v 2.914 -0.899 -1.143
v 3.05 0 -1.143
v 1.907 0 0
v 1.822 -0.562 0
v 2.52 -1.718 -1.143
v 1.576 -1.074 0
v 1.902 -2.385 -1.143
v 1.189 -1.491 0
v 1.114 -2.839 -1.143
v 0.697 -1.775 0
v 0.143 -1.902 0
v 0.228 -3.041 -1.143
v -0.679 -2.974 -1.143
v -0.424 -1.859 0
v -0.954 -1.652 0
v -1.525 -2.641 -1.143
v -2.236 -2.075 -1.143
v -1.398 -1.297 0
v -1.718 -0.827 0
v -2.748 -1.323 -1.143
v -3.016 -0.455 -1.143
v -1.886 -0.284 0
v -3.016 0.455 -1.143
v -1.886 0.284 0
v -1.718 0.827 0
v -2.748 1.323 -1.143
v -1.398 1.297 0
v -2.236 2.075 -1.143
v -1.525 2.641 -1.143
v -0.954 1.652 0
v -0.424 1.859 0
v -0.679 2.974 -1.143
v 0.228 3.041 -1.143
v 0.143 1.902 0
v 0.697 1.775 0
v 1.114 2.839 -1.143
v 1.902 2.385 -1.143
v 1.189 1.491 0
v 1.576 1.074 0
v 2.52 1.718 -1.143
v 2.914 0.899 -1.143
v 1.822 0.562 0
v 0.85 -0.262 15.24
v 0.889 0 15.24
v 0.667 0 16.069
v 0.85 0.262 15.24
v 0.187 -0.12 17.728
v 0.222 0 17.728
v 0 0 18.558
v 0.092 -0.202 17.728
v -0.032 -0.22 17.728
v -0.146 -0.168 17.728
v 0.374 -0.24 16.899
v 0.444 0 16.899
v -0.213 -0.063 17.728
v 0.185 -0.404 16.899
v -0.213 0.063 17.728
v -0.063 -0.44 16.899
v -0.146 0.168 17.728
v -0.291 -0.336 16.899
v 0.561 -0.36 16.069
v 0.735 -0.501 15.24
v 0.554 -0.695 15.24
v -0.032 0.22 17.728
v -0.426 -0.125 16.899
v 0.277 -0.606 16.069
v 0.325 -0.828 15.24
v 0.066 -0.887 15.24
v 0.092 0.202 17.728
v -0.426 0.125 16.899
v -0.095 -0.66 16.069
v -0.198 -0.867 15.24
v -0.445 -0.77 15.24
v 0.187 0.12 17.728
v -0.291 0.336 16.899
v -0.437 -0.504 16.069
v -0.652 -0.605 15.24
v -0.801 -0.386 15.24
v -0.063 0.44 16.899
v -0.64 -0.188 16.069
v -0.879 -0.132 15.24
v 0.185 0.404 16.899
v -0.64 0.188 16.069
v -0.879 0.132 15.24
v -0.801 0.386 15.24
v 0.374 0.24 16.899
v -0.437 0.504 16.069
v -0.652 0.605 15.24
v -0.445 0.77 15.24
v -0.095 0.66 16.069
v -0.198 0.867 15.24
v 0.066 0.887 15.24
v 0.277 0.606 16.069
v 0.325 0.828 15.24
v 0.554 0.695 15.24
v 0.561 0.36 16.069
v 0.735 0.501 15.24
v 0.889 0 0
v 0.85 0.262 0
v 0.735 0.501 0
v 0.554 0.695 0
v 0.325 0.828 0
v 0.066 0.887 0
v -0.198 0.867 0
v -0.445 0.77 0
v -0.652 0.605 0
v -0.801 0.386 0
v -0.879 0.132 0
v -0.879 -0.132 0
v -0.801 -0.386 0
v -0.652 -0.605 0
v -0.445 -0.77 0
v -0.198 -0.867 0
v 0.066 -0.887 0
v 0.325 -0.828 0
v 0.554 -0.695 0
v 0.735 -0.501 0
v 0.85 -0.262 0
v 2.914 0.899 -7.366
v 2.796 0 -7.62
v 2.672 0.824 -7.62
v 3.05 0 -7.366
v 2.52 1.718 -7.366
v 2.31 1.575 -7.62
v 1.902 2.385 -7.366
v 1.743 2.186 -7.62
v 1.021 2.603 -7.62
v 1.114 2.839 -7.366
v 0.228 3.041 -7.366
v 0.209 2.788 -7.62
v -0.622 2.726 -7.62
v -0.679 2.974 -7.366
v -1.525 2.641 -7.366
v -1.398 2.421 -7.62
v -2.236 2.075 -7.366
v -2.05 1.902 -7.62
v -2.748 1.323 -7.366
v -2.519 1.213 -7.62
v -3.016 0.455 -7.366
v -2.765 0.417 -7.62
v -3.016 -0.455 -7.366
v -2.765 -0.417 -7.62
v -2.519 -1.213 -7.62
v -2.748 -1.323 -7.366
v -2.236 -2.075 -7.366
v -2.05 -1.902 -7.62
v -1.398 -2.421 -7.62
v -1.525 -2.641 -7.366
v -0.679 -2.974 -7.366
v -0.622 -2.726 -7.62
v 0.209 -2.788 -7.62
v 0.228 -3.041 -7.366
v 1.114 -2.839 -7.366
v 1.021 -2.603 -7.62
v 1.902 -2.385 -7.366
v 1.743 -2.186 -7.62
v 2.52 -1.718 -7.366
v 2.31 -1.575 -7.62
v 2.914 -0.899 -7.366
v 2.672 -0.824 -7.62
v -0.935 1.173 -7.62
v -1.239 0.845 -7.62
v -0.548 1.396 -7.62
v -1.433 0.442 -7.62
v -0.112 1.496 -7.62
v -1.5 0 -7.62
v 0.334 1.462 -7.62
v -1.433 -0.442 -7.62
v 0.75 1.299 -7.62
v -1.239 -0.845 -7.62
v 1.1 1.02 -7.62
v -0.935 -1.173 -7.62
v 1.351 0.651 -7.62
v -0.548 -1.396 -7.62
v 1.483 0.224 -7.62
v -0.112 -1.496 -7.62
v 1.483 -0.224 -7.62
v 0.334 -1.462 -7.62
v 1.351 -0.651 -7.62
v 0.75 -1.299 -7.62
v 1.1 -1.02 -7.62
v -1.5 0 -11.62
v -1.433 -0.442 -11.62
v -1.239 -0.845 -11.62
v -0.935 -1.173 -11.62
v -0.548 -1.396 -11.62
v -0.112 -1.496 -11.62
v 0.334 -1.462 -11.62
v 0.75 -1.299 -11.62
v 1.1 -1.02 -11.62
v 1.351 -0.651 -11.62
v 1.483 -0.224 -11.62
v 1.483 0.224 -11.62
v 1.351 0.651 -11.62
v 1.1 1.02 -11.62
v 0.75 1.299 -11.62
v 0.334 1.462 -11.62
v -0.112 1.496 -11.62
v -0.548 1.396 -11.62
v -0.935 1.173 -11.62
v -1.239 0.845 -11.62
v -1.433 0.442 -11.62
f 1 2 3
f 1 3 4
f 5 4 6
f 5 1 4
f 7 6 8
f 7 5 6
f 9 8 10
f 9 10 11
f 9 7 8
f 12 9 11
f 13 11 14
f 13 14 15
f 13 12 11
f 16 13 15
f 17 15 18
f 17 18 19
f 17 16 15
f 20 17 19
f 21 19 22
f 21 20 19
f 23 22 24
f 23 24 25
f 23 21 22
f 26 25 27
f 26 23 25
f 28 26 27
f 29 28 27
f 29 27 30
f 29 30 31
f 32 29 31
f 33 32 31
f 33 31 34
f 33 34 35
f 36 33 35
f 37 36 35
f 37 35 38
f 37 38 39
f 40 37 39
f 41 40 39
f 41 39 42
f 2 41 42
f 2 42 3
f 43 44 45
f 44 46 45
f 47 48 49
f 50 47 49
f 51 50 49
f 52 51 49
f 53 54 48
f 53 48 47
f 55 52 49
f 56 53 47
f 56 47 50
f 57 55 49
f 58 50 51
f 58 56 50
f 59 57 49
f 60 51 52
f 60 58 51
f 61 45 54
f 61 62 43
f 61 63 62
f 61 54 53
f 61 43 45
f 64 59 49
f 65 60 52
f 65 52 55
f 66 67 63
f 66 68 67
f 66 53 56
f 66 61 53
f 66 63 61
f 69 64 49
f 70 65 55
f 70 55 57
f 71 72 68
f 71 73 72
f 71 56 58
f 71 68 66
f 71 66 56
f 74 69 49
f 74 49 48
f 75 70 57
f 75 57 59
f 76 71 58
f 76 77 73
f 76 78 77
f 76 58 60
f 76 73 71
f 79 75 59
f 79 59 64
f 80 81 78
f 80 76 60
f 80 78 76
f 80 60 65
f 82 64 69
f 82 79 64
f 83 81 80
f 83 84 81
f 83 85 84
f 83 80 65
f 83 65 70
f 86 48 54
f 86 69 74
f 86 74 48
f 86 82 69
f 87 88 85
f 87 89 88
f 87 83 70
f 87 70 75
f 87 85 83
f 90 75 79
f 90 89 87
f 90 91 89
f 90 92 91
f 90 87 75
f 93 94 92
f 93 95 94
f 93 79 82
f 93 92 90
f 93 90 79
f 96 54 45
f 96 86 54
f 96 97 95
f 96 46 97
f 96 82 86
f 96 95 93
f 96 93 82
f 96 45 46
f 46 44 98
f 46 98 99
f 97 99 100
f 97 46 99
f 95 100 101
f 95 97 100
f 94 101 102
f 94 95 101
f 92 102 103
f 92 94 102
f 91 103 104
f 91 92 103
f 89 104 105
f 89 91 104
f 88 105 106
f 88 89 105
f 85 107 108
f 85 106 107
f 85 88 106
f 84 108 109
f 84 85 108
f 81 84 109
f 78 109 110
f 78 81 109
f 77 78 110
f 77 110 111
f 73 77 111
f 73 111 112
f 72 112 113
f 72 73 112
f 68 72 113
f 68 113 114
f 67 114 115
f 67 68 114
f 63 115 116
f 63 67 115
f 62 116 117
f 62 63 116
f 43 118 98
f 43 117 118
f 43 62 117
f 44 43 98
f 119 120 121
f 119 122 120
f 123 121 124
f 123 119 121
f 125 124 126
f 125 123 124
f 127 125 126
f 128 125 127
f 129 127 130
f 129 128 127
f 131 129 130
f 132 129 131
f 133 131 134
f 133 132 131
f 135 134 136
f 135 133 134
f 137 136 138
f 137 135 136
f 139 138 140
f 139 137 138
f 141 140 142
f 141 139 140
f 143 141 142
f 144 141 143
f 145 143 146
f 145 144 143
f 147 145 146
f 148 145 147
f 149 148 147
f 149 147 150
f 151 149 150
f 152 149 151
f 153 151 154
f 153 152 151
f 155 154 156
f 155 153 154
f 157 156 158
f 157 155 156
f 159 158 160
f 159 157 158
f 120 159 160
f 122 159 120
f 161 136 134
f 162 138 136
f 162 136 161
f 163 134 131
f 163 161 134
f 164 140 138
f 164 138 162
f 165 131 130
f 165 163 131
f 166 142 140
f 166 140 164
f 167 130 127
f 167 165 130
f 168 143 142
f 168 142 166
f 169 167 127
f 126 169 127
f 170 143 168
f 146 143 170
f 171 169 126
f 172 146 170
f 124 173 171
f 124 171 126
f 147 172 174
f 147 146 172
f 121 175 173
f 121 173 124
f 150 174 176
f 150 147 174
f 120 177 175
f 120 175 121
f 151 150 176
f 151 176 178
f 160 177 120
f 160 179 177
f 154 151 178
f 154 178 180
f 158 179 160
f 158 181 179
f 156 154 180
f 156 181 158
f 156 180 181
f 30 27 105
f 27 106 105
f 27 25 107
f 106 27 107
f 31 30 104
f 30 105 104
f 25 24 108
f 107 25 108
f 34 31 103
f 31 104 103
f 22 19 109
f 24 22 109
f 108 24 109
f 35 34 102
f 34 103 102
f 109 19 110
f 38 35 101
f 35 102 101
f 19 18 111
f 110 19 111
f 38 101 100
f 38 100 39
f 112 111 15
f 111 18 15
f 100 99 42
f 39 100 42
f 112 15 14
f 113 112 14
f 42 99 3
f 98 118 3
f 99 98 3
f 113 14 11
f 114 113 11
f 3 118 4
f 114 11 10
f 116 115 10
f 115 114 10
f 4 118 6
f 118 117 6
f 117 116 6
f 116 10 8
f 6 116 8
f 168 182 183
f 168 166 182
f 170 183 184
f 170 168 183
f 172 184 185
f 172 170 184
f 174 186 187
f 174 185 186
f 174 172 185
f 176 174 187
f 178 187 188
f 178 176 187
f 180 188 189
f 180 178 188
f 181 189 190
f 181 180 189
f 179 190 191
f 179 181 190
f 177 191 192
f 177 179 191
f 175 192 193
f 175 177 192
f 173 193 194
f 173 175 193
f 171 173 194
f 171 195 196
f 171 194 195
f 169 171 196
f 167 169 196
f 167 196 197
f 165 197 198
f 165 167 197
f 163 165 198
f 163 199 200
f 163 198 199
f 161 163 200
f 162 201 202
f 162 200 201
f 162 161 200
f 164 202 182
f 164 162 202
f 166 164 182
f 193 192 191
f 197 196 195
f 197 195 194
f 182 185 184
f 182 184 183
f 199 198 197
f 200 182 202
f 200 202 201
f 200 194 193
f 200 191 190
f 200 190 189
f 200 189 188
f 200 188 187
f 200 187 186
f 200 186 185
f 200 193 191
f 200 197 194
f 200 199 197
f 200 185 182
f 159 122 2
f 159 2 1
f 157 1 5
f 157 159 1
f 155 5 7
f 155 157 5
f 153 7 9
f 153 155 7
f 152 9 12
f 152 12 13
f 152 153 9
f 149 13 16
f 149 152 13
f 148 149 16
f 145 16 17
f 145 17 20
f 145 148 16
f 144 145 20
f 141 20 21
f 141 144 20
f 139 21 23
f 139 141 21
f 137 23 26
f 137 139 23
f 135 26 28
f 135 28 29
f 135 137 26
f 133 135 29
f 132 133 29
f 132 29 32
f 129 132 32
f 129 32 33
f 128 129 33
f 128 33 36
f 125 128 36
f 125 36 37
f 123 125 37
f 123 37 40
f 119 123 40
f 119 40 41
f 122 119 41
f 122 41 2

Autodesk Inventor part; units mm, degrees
ref_plane "YZ Plane" through (0, 0, 0) normal (1, 0, 0) x (0, 1, 0)
ref_plane "XZ Plane" through (0, 0, 0) normal (0, 1, 0) x (-1, 0, 0)
ref_plane "XY Plane" through (0, 0, 0) normal (0, 0, 1) x (1, 0, 0)
sketch "Sketch1" plane through (0, 0, 0) normal (0, 1, 0) x (-1, 0, 0)
  line L0 (0, 0) -> (-3.05, 0)
  line L1 (-3.05, 0) -> (-3.05, -7.62)
  line L2 (-3.05, -7.62) -> (0, -7.62)
  line L3 (0, -7.62) -> (0, 0)
  line L4 (0, 0) -> (-0.889, 0)
  line L5 (-0.889, 0) -> (-0.889, 15.24)
  line L6 (-0.889, 15.24) -> (0, 15.24)
  line L7 (0, 15.24) -> (0, 0)
  line L8 (-0.889, 15.24) -> (0, 18.5578)
  line L9 (-0.889, 15.24) -> (2.5458, 15.24) construction
  line L10 (0, 18.5578) -> (0, 15.24)
  dimension "d0" = 3.05
  dimension "d1" = 7.62
  dimension "d2" = 0.889
  dimension "d3" = 15.24
  dimension "d13" = 75
  dimension "d14" = 15
  dimension "d15" = 18.5578
  dimension "d16" = 26.1778
revolve "Revolution1" add sketch "Sketch1" angle 360 about axis through (0, 0, 15.24) along (0, 0, -1)
sketch "Sketch2" plane through (0, 0, -7.62) normal (0, 0, -1) x (-1, 0, 0)
  circle A0 centre (0, 0) radius 3.05 projected
  circle A1 centre (0, 0) radius 1.5
  dimension "d5" = 3
extrude "Extrusion1" add sketch "Sketch2" along normal blind 4 contours A1
chamfer "Chamfer1" distance 1.143 angle 45 1 edges at (-3.05, 0, 0)
chamfer "Chamfer2" distance 0.254 angle 45 1 edges at (-3.05, 0, -7.62)
thread "Thread1" size "M3x0.5" class "6g" standard "ANSI Metric M Profile" full length
properties part number "carbide_probe_30deg_tip_r01" material "Steel, High Strength, Low Alloy"
